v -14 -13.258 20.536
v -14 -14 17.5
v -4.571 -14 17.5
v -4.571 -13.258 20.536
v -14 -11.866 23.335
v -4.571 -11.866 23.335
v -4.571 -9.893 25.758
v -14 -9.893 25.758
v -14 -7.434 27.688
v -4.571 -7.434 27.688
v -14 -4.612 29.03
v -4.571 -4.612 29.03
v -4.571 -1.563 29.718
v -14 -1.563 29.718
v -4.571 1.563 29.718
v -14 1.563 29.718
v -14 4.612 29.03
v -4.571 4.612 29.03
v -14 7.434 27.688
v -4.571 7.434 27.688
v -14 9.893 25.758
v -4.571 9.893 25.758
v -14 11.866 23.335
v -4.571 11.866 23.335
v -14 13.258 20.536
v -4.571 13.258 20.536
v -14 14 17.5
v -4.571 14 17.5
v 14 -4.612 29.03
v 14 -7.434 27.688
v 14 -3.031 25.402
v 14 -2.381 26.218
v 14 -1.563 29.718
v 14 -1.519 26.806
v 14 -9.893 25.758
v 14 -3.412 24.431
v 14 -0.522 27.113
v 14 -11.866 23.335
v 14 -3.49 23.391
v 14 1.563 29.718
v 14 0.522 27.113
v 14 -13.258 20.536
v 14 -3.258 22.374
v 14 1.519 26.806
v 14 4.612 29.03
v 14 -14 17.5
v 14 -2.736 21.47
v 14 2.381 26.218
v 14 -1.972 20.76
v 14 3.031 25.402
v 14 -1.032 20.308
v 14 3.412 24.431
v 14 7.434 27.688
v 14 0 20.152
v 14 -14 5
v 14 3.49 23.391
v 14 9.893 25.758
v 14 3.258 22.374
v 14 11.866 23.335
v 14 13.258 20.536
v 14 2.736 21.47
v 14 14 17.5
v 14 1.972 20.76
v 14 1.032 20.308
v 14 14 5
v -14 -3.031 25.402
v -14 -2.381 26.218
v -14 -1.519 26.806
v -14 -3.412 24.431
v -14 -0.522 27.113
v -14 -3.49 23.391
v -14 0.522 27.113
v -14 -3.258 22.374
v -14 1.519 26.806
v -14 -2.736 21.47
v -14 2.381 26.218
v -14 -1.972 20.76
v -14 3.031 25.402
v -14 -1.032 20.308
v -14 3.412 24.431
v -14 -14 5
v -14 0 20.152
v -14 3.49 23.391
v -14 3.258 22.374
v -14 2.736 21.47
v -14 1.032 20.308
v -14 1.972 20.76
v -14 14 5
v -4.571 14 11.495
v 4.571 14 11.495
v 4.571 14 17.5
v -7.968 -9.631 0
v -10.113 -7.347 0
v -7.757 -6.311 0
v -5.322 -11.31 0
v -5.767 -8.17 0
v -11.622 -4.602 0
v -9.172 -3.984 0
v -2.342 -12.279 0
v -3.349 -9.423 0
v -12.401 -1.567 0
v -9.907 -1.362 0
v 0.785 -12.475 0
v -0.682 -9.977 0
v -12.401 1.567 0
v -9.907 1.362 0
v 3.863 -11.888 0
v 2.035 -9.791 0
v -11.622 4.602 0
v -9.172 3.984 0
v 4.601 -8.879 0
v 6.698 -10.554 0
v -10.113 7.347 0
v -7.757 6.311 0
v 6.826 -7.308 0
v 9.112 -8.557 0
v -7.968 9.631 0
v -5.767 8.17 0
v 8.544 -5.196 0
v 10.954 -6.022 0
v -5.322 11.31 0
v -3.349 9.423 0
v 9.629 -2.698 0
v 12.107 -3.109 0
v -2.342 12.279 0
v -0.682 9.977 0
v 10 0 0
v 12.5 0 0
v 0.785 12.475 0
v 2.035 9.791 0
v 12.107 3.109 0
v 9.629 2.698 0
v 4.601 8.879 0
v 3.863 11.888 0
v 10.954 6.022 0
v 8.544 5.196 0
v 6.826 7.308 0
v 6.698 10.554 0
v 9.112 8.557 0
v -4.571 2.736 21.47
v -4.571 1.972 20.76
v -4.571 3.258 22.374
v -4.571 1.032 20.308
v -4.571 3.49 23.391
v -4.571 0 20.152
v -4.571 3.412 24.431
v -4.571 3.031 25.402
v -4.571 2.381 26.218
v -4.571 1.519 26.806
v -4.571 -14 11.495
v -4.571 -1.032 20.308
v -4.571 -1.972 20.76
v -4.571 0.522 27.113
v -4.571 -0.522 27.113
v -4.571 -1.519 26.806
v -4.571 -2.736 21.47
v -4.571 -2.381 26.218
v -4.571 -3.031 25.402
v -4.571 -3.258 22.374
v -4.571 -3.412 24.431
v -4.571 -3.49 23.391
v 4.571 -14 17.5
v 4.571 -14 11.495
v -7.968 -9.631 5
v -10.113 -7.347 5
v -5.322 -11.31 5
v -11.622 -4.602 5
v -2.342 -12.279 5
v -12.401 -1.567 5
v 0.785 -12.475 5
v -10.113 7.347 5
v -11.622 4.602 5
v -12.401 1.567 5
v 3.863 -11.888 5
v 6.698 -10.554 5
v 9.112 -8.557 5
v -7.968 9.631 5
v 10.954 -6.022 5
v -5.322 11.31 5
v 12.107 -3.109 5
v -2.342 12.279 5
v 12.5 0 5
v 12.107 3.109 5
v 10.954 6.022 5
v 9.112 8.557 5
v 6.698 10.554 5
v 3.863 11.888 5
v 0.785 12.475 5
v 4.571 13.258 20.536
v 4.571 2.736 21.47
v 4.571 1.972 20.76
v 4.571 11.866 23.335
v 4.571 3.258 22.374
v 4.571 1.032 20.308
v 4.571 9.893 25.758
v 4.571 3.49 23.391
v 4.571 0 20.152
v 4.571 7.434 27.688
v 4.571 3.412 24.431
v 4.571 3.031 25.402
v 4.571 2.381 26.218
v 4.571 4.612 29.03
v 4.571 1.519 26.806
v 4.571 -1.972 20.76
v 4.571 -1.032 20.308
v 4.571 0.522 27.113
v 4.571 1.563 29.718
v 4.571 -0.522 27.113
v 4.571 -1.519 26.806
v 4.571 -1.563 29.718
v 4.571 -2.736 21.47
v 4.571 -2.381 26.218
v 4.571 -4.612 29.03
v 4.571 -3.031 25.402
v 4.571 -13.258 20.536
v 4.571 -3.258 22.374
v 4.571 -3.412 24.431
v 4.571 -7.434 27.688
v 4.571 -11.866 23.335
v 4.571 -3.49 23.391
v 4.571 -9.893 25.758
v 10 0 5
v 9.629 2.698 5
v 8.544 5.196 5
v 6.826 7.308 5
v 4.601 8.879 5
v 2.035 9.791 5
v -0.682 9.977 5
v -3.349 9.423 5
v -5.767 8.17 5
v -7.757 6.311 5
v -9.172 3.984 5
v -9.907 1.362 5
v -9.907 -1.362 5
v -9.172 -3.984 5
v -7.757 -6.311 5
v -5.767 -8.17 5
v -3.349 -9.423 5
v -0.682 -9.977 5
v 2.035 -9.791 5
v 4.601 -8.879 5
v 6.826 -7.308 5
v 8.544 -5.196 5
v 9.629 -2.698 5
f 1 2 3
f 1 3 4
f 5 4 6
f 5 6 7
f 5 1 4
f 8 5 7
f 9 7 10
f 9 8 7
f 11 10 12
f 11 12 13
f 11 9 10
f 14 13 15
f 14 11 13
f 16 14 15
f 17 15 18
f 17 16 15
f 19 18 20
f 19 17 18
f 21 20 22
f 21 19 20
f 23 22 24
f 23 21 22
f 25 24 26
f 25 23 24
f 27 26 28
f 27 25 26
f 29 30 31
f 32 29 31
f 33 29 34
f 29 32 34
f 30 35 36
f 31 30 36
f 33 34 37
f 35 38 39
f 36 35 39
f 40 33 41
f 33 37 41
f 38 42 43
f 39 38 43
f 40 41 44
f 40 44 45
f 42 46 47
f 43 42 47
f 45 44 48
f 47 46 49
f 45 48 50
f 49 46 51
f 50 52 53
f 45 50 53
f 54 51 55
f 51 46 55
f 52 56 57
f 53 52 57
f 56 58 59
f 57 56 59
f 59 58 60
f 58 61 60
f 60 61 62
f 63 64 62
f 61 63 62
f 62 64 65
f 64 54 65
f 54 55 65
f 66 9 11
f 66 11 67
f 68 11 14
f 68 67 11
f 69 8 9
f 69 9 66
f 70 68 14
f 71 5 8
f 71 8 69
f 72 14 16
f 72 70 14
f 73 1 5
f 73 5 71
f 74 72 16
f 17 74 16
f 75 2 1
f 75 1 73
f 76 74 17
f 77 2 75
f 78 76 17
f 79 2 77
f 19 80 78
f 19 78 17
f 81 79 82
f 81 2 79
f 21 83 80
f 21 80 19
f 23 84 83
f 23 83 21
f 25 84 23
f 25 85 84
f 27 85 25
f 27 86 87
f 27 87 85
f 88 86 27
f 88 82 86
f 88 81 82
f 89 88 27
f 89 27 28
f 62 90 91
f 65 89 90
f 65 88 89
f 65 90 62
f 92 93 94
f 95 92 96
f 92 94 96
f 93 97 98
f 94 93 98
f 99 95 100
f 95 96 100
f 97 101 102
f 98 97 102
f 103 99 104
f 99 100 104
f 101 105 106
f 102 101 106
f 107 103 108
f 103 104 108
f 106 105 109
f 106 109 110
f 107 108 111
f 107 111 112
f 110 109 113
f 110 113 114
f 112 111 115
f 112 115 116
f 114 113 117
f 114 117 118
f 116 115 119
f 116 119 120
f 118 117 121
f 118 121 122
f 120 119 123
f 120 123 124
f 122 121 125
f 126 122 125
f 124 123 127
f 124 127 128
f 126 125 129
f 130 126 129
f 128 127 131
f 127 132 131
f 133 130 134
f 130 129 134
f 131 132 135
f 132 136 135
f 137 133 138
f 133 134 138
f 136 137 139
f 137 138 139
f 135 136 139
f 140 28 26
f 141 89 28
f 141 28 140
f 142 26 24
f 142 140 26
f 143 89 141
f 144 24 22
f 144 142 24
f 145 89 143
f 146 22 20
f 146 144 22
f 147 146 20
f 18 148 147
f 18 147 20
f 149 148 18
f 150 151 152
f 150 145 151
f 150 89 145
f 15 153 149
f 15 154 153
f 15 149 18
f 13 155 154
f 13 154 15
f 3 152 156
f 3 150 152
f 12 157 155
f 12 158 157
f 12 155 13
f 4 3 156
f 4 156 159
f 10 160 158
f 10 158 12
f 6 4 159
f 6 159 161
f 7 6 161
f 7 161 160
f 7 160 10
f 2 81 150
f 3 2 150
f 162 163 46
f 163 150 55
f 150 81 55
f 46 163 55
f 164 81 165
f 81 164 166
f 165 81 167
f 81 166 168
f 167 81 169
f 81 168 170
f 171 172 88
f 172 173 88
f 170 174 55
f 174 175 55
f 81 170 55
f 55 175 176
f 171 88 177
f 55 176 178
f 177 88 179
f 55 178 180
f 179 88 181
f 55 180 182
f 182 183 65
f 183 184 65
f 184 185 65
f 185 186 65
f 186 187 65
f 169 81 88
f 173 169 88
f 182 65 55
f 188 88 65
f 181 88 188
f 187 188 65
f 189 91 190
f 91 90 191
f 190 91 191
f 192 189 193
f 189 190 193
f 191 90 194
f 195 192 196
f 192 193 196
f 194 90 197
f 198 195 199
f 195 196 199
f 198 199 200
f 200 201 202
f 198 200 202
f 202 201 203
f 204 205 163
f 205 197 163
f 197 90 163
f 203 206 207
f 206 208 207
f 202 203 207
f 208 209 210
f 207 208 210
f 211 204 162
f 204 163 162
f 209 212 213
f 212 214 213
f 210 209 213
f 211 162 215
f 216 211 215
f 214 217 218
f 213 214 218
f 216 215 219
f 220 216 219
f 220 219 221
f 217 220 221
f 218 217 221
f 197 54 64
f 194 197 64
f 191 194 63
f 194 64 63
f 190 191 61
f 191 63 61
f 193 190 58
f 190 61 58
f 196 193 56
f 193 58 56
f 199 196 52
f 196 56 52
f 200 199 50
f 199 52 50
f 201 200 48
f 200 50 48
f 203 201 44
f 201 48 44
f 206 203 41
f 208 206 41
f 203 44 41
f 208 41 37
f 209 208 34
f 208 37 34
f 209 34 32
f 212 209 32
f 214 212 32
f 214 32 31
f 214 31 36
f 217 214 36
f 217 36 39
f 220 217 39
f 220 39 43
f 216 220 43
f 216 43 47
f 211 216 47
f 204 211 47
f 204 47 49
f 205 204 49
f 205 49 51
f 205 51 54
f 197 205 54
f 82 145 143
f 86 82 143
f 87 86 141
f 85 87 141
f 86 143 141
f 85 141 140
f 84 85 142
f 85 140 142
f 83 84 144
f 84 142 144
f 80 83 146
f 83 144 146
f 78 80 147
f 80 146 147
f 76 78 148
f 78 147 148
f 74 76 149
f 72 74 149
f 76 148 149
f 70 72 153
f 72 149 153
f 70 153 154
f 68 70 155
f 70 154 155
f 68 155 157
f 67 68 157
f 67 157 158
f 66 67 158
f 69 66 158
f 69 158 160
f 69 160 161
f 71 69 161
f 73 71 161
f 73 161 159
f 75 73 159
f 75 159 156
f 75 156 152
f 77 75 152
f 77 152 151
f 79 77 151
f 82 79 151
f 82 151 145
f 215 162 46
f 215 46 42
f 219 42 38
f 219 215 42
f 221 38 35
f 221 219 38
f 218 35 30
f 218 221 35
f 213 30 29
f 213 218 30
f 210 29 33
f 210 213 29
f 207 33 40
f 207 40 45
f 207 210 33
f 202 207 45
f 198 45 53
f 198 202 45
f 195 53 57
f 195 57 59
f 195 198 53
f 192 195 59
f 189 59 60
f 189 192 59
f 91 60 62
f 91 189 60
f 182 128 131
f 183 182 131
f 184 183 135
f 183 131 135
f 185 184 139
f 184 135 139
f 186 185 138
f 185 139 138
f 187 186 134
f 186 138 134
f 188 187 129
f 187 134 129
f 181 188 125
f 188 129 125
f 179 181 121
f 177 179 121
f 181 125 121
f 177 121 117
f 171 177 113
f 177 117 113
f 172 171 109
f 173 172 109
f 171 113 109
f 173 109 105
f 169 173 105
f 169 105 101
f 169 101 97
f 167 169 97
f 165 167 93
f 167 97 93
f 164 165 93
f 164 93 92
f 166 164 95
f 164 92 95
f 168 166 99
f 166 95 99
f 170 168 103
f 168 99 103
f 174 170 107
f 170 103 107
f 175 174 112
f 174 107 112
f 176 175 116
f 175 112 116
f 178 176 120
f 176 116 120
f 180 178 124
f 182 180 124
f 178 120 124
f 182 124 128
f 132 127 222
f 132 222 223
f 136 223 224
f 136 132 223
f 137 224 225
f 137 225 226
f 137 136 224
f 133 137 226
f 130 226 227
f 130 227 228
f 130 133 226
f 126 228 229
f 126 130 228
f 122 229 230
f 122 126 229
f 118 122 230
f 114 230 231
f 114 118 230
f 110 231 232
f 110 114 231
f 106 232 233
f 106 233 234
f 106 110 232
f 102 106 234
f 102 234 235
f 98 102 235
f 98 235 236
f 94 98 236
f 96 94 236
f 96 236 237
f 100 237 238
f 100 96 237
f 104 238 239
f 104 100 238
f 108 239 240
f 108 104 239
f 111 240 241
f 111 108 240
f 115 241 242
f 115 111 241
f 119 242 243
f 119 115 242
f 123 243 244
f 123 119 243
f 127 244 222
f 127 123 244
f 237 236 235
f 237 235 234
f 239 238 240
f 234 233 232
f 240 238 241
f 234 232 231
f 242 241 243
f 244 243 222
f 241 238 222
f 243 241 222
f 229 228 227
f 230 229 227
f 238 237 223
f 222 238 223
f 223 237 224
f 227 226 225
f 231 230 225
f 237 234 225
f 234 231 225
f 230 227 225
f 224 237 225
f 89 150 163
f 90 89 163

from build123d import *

# Parameters (mm, degrees)
SKETCH1_R               = 12.5
SKETCH1_R_2             = 10
BOSS_EXTRUDE1_DEPTH     = 5
SKETCH2_W               = 28
SKETCH2_H               = 28
BOSS_EXTRUDE2_DEPTH     = 25
CUT_EXTRUDE1_DEPTH      = 29
SKETCH7_W               = 9.14199999
SKETCH7_H               = 19.416637146
CUT_EXTRUDE2_DEPTH      = 1
CUT_EXTRUDE2_DEPTH_BACK = 29
SKETCH8_R               = 3.5
CUT_EXTRUDE3_DEPTH      = 1
CUT_EXTRUDE3_DEPTH_BACK = 29


with BuildPart() as part:
    # Sketch1 → Boss-Extrude1 (new body)
    with BuildSketch(Plane.XY):
        Circle(SKETCH1_R)
        Circle(SKETCH1_R_2, mode=Mode.SUBTRACT)
    extrude(amount=BOSS_EXTRUDE1_DEPTH)

    # Sketch2 → Boss-Extrude2 (add)
    with BuildSketch(Plane.XY.offset(5)):
        Rectangle(SKETCH2_W, SKETCH2_H)
    extrude(amount=BOSS_EXTRUDE2_DEPTH)

    # Sketch3 → Cut-Extrude1 (cut, through all)
    with BuildSketch(Plane.ZY.offset(14)):
        with BuildLine():
            Line((17.5, 14), (30, 14))
            Line((30, 14), (30, -14))
            Line((30, -14), (17.5, -14))
            ThreePointArc((17.5, -14), (29.804652609, 0), (17.5, 14))
        make_face()
    extrude(amount=-CUT_EXTRUDE1_DEPTH, mode=Mode.SUBTRACT)

    # Sketch7 → Cut-Extrude2 (cut, two sides)
    with BuildSketch(Plane.XZ.offset(14)) as cut_extrude2_sk:
        with Locations((0, 21.203451283)):
            Rectangle(SKETCH7_W, SKETCH7_H)
    extrude(amount=CUT_EXTRUDE2_DEPTH, mode=Mode.SUBTRACT)
    extrude(cut_extrude2_sk.sketch, amount=-CUT_EXTRUDE2_DEPTH_BACK, mode=Mode.SUBTRACT)

    # Sketch8 → Cut-Extrude3 (cut, two sides)
    with BuildSketch(Plane(origin=(14, 0, 0), x_dir=(0, 0, -1), z_dir=(1, 0, 0))) as cut_extrude3_sk:
        with Locations((-23.652326304, 0)):
            Circle(SKETCH8_R)
    extrude(amount=CUT_EXTRUDE3_DEPTH, mode=Mode.SUBTRACT)
    extrude(cut_extrude3_sk.sketch, amount=-CUT_EXTRUDE3_DEPTH_BACK, mode=Mode.SUBTRACT)


solid = part.part
